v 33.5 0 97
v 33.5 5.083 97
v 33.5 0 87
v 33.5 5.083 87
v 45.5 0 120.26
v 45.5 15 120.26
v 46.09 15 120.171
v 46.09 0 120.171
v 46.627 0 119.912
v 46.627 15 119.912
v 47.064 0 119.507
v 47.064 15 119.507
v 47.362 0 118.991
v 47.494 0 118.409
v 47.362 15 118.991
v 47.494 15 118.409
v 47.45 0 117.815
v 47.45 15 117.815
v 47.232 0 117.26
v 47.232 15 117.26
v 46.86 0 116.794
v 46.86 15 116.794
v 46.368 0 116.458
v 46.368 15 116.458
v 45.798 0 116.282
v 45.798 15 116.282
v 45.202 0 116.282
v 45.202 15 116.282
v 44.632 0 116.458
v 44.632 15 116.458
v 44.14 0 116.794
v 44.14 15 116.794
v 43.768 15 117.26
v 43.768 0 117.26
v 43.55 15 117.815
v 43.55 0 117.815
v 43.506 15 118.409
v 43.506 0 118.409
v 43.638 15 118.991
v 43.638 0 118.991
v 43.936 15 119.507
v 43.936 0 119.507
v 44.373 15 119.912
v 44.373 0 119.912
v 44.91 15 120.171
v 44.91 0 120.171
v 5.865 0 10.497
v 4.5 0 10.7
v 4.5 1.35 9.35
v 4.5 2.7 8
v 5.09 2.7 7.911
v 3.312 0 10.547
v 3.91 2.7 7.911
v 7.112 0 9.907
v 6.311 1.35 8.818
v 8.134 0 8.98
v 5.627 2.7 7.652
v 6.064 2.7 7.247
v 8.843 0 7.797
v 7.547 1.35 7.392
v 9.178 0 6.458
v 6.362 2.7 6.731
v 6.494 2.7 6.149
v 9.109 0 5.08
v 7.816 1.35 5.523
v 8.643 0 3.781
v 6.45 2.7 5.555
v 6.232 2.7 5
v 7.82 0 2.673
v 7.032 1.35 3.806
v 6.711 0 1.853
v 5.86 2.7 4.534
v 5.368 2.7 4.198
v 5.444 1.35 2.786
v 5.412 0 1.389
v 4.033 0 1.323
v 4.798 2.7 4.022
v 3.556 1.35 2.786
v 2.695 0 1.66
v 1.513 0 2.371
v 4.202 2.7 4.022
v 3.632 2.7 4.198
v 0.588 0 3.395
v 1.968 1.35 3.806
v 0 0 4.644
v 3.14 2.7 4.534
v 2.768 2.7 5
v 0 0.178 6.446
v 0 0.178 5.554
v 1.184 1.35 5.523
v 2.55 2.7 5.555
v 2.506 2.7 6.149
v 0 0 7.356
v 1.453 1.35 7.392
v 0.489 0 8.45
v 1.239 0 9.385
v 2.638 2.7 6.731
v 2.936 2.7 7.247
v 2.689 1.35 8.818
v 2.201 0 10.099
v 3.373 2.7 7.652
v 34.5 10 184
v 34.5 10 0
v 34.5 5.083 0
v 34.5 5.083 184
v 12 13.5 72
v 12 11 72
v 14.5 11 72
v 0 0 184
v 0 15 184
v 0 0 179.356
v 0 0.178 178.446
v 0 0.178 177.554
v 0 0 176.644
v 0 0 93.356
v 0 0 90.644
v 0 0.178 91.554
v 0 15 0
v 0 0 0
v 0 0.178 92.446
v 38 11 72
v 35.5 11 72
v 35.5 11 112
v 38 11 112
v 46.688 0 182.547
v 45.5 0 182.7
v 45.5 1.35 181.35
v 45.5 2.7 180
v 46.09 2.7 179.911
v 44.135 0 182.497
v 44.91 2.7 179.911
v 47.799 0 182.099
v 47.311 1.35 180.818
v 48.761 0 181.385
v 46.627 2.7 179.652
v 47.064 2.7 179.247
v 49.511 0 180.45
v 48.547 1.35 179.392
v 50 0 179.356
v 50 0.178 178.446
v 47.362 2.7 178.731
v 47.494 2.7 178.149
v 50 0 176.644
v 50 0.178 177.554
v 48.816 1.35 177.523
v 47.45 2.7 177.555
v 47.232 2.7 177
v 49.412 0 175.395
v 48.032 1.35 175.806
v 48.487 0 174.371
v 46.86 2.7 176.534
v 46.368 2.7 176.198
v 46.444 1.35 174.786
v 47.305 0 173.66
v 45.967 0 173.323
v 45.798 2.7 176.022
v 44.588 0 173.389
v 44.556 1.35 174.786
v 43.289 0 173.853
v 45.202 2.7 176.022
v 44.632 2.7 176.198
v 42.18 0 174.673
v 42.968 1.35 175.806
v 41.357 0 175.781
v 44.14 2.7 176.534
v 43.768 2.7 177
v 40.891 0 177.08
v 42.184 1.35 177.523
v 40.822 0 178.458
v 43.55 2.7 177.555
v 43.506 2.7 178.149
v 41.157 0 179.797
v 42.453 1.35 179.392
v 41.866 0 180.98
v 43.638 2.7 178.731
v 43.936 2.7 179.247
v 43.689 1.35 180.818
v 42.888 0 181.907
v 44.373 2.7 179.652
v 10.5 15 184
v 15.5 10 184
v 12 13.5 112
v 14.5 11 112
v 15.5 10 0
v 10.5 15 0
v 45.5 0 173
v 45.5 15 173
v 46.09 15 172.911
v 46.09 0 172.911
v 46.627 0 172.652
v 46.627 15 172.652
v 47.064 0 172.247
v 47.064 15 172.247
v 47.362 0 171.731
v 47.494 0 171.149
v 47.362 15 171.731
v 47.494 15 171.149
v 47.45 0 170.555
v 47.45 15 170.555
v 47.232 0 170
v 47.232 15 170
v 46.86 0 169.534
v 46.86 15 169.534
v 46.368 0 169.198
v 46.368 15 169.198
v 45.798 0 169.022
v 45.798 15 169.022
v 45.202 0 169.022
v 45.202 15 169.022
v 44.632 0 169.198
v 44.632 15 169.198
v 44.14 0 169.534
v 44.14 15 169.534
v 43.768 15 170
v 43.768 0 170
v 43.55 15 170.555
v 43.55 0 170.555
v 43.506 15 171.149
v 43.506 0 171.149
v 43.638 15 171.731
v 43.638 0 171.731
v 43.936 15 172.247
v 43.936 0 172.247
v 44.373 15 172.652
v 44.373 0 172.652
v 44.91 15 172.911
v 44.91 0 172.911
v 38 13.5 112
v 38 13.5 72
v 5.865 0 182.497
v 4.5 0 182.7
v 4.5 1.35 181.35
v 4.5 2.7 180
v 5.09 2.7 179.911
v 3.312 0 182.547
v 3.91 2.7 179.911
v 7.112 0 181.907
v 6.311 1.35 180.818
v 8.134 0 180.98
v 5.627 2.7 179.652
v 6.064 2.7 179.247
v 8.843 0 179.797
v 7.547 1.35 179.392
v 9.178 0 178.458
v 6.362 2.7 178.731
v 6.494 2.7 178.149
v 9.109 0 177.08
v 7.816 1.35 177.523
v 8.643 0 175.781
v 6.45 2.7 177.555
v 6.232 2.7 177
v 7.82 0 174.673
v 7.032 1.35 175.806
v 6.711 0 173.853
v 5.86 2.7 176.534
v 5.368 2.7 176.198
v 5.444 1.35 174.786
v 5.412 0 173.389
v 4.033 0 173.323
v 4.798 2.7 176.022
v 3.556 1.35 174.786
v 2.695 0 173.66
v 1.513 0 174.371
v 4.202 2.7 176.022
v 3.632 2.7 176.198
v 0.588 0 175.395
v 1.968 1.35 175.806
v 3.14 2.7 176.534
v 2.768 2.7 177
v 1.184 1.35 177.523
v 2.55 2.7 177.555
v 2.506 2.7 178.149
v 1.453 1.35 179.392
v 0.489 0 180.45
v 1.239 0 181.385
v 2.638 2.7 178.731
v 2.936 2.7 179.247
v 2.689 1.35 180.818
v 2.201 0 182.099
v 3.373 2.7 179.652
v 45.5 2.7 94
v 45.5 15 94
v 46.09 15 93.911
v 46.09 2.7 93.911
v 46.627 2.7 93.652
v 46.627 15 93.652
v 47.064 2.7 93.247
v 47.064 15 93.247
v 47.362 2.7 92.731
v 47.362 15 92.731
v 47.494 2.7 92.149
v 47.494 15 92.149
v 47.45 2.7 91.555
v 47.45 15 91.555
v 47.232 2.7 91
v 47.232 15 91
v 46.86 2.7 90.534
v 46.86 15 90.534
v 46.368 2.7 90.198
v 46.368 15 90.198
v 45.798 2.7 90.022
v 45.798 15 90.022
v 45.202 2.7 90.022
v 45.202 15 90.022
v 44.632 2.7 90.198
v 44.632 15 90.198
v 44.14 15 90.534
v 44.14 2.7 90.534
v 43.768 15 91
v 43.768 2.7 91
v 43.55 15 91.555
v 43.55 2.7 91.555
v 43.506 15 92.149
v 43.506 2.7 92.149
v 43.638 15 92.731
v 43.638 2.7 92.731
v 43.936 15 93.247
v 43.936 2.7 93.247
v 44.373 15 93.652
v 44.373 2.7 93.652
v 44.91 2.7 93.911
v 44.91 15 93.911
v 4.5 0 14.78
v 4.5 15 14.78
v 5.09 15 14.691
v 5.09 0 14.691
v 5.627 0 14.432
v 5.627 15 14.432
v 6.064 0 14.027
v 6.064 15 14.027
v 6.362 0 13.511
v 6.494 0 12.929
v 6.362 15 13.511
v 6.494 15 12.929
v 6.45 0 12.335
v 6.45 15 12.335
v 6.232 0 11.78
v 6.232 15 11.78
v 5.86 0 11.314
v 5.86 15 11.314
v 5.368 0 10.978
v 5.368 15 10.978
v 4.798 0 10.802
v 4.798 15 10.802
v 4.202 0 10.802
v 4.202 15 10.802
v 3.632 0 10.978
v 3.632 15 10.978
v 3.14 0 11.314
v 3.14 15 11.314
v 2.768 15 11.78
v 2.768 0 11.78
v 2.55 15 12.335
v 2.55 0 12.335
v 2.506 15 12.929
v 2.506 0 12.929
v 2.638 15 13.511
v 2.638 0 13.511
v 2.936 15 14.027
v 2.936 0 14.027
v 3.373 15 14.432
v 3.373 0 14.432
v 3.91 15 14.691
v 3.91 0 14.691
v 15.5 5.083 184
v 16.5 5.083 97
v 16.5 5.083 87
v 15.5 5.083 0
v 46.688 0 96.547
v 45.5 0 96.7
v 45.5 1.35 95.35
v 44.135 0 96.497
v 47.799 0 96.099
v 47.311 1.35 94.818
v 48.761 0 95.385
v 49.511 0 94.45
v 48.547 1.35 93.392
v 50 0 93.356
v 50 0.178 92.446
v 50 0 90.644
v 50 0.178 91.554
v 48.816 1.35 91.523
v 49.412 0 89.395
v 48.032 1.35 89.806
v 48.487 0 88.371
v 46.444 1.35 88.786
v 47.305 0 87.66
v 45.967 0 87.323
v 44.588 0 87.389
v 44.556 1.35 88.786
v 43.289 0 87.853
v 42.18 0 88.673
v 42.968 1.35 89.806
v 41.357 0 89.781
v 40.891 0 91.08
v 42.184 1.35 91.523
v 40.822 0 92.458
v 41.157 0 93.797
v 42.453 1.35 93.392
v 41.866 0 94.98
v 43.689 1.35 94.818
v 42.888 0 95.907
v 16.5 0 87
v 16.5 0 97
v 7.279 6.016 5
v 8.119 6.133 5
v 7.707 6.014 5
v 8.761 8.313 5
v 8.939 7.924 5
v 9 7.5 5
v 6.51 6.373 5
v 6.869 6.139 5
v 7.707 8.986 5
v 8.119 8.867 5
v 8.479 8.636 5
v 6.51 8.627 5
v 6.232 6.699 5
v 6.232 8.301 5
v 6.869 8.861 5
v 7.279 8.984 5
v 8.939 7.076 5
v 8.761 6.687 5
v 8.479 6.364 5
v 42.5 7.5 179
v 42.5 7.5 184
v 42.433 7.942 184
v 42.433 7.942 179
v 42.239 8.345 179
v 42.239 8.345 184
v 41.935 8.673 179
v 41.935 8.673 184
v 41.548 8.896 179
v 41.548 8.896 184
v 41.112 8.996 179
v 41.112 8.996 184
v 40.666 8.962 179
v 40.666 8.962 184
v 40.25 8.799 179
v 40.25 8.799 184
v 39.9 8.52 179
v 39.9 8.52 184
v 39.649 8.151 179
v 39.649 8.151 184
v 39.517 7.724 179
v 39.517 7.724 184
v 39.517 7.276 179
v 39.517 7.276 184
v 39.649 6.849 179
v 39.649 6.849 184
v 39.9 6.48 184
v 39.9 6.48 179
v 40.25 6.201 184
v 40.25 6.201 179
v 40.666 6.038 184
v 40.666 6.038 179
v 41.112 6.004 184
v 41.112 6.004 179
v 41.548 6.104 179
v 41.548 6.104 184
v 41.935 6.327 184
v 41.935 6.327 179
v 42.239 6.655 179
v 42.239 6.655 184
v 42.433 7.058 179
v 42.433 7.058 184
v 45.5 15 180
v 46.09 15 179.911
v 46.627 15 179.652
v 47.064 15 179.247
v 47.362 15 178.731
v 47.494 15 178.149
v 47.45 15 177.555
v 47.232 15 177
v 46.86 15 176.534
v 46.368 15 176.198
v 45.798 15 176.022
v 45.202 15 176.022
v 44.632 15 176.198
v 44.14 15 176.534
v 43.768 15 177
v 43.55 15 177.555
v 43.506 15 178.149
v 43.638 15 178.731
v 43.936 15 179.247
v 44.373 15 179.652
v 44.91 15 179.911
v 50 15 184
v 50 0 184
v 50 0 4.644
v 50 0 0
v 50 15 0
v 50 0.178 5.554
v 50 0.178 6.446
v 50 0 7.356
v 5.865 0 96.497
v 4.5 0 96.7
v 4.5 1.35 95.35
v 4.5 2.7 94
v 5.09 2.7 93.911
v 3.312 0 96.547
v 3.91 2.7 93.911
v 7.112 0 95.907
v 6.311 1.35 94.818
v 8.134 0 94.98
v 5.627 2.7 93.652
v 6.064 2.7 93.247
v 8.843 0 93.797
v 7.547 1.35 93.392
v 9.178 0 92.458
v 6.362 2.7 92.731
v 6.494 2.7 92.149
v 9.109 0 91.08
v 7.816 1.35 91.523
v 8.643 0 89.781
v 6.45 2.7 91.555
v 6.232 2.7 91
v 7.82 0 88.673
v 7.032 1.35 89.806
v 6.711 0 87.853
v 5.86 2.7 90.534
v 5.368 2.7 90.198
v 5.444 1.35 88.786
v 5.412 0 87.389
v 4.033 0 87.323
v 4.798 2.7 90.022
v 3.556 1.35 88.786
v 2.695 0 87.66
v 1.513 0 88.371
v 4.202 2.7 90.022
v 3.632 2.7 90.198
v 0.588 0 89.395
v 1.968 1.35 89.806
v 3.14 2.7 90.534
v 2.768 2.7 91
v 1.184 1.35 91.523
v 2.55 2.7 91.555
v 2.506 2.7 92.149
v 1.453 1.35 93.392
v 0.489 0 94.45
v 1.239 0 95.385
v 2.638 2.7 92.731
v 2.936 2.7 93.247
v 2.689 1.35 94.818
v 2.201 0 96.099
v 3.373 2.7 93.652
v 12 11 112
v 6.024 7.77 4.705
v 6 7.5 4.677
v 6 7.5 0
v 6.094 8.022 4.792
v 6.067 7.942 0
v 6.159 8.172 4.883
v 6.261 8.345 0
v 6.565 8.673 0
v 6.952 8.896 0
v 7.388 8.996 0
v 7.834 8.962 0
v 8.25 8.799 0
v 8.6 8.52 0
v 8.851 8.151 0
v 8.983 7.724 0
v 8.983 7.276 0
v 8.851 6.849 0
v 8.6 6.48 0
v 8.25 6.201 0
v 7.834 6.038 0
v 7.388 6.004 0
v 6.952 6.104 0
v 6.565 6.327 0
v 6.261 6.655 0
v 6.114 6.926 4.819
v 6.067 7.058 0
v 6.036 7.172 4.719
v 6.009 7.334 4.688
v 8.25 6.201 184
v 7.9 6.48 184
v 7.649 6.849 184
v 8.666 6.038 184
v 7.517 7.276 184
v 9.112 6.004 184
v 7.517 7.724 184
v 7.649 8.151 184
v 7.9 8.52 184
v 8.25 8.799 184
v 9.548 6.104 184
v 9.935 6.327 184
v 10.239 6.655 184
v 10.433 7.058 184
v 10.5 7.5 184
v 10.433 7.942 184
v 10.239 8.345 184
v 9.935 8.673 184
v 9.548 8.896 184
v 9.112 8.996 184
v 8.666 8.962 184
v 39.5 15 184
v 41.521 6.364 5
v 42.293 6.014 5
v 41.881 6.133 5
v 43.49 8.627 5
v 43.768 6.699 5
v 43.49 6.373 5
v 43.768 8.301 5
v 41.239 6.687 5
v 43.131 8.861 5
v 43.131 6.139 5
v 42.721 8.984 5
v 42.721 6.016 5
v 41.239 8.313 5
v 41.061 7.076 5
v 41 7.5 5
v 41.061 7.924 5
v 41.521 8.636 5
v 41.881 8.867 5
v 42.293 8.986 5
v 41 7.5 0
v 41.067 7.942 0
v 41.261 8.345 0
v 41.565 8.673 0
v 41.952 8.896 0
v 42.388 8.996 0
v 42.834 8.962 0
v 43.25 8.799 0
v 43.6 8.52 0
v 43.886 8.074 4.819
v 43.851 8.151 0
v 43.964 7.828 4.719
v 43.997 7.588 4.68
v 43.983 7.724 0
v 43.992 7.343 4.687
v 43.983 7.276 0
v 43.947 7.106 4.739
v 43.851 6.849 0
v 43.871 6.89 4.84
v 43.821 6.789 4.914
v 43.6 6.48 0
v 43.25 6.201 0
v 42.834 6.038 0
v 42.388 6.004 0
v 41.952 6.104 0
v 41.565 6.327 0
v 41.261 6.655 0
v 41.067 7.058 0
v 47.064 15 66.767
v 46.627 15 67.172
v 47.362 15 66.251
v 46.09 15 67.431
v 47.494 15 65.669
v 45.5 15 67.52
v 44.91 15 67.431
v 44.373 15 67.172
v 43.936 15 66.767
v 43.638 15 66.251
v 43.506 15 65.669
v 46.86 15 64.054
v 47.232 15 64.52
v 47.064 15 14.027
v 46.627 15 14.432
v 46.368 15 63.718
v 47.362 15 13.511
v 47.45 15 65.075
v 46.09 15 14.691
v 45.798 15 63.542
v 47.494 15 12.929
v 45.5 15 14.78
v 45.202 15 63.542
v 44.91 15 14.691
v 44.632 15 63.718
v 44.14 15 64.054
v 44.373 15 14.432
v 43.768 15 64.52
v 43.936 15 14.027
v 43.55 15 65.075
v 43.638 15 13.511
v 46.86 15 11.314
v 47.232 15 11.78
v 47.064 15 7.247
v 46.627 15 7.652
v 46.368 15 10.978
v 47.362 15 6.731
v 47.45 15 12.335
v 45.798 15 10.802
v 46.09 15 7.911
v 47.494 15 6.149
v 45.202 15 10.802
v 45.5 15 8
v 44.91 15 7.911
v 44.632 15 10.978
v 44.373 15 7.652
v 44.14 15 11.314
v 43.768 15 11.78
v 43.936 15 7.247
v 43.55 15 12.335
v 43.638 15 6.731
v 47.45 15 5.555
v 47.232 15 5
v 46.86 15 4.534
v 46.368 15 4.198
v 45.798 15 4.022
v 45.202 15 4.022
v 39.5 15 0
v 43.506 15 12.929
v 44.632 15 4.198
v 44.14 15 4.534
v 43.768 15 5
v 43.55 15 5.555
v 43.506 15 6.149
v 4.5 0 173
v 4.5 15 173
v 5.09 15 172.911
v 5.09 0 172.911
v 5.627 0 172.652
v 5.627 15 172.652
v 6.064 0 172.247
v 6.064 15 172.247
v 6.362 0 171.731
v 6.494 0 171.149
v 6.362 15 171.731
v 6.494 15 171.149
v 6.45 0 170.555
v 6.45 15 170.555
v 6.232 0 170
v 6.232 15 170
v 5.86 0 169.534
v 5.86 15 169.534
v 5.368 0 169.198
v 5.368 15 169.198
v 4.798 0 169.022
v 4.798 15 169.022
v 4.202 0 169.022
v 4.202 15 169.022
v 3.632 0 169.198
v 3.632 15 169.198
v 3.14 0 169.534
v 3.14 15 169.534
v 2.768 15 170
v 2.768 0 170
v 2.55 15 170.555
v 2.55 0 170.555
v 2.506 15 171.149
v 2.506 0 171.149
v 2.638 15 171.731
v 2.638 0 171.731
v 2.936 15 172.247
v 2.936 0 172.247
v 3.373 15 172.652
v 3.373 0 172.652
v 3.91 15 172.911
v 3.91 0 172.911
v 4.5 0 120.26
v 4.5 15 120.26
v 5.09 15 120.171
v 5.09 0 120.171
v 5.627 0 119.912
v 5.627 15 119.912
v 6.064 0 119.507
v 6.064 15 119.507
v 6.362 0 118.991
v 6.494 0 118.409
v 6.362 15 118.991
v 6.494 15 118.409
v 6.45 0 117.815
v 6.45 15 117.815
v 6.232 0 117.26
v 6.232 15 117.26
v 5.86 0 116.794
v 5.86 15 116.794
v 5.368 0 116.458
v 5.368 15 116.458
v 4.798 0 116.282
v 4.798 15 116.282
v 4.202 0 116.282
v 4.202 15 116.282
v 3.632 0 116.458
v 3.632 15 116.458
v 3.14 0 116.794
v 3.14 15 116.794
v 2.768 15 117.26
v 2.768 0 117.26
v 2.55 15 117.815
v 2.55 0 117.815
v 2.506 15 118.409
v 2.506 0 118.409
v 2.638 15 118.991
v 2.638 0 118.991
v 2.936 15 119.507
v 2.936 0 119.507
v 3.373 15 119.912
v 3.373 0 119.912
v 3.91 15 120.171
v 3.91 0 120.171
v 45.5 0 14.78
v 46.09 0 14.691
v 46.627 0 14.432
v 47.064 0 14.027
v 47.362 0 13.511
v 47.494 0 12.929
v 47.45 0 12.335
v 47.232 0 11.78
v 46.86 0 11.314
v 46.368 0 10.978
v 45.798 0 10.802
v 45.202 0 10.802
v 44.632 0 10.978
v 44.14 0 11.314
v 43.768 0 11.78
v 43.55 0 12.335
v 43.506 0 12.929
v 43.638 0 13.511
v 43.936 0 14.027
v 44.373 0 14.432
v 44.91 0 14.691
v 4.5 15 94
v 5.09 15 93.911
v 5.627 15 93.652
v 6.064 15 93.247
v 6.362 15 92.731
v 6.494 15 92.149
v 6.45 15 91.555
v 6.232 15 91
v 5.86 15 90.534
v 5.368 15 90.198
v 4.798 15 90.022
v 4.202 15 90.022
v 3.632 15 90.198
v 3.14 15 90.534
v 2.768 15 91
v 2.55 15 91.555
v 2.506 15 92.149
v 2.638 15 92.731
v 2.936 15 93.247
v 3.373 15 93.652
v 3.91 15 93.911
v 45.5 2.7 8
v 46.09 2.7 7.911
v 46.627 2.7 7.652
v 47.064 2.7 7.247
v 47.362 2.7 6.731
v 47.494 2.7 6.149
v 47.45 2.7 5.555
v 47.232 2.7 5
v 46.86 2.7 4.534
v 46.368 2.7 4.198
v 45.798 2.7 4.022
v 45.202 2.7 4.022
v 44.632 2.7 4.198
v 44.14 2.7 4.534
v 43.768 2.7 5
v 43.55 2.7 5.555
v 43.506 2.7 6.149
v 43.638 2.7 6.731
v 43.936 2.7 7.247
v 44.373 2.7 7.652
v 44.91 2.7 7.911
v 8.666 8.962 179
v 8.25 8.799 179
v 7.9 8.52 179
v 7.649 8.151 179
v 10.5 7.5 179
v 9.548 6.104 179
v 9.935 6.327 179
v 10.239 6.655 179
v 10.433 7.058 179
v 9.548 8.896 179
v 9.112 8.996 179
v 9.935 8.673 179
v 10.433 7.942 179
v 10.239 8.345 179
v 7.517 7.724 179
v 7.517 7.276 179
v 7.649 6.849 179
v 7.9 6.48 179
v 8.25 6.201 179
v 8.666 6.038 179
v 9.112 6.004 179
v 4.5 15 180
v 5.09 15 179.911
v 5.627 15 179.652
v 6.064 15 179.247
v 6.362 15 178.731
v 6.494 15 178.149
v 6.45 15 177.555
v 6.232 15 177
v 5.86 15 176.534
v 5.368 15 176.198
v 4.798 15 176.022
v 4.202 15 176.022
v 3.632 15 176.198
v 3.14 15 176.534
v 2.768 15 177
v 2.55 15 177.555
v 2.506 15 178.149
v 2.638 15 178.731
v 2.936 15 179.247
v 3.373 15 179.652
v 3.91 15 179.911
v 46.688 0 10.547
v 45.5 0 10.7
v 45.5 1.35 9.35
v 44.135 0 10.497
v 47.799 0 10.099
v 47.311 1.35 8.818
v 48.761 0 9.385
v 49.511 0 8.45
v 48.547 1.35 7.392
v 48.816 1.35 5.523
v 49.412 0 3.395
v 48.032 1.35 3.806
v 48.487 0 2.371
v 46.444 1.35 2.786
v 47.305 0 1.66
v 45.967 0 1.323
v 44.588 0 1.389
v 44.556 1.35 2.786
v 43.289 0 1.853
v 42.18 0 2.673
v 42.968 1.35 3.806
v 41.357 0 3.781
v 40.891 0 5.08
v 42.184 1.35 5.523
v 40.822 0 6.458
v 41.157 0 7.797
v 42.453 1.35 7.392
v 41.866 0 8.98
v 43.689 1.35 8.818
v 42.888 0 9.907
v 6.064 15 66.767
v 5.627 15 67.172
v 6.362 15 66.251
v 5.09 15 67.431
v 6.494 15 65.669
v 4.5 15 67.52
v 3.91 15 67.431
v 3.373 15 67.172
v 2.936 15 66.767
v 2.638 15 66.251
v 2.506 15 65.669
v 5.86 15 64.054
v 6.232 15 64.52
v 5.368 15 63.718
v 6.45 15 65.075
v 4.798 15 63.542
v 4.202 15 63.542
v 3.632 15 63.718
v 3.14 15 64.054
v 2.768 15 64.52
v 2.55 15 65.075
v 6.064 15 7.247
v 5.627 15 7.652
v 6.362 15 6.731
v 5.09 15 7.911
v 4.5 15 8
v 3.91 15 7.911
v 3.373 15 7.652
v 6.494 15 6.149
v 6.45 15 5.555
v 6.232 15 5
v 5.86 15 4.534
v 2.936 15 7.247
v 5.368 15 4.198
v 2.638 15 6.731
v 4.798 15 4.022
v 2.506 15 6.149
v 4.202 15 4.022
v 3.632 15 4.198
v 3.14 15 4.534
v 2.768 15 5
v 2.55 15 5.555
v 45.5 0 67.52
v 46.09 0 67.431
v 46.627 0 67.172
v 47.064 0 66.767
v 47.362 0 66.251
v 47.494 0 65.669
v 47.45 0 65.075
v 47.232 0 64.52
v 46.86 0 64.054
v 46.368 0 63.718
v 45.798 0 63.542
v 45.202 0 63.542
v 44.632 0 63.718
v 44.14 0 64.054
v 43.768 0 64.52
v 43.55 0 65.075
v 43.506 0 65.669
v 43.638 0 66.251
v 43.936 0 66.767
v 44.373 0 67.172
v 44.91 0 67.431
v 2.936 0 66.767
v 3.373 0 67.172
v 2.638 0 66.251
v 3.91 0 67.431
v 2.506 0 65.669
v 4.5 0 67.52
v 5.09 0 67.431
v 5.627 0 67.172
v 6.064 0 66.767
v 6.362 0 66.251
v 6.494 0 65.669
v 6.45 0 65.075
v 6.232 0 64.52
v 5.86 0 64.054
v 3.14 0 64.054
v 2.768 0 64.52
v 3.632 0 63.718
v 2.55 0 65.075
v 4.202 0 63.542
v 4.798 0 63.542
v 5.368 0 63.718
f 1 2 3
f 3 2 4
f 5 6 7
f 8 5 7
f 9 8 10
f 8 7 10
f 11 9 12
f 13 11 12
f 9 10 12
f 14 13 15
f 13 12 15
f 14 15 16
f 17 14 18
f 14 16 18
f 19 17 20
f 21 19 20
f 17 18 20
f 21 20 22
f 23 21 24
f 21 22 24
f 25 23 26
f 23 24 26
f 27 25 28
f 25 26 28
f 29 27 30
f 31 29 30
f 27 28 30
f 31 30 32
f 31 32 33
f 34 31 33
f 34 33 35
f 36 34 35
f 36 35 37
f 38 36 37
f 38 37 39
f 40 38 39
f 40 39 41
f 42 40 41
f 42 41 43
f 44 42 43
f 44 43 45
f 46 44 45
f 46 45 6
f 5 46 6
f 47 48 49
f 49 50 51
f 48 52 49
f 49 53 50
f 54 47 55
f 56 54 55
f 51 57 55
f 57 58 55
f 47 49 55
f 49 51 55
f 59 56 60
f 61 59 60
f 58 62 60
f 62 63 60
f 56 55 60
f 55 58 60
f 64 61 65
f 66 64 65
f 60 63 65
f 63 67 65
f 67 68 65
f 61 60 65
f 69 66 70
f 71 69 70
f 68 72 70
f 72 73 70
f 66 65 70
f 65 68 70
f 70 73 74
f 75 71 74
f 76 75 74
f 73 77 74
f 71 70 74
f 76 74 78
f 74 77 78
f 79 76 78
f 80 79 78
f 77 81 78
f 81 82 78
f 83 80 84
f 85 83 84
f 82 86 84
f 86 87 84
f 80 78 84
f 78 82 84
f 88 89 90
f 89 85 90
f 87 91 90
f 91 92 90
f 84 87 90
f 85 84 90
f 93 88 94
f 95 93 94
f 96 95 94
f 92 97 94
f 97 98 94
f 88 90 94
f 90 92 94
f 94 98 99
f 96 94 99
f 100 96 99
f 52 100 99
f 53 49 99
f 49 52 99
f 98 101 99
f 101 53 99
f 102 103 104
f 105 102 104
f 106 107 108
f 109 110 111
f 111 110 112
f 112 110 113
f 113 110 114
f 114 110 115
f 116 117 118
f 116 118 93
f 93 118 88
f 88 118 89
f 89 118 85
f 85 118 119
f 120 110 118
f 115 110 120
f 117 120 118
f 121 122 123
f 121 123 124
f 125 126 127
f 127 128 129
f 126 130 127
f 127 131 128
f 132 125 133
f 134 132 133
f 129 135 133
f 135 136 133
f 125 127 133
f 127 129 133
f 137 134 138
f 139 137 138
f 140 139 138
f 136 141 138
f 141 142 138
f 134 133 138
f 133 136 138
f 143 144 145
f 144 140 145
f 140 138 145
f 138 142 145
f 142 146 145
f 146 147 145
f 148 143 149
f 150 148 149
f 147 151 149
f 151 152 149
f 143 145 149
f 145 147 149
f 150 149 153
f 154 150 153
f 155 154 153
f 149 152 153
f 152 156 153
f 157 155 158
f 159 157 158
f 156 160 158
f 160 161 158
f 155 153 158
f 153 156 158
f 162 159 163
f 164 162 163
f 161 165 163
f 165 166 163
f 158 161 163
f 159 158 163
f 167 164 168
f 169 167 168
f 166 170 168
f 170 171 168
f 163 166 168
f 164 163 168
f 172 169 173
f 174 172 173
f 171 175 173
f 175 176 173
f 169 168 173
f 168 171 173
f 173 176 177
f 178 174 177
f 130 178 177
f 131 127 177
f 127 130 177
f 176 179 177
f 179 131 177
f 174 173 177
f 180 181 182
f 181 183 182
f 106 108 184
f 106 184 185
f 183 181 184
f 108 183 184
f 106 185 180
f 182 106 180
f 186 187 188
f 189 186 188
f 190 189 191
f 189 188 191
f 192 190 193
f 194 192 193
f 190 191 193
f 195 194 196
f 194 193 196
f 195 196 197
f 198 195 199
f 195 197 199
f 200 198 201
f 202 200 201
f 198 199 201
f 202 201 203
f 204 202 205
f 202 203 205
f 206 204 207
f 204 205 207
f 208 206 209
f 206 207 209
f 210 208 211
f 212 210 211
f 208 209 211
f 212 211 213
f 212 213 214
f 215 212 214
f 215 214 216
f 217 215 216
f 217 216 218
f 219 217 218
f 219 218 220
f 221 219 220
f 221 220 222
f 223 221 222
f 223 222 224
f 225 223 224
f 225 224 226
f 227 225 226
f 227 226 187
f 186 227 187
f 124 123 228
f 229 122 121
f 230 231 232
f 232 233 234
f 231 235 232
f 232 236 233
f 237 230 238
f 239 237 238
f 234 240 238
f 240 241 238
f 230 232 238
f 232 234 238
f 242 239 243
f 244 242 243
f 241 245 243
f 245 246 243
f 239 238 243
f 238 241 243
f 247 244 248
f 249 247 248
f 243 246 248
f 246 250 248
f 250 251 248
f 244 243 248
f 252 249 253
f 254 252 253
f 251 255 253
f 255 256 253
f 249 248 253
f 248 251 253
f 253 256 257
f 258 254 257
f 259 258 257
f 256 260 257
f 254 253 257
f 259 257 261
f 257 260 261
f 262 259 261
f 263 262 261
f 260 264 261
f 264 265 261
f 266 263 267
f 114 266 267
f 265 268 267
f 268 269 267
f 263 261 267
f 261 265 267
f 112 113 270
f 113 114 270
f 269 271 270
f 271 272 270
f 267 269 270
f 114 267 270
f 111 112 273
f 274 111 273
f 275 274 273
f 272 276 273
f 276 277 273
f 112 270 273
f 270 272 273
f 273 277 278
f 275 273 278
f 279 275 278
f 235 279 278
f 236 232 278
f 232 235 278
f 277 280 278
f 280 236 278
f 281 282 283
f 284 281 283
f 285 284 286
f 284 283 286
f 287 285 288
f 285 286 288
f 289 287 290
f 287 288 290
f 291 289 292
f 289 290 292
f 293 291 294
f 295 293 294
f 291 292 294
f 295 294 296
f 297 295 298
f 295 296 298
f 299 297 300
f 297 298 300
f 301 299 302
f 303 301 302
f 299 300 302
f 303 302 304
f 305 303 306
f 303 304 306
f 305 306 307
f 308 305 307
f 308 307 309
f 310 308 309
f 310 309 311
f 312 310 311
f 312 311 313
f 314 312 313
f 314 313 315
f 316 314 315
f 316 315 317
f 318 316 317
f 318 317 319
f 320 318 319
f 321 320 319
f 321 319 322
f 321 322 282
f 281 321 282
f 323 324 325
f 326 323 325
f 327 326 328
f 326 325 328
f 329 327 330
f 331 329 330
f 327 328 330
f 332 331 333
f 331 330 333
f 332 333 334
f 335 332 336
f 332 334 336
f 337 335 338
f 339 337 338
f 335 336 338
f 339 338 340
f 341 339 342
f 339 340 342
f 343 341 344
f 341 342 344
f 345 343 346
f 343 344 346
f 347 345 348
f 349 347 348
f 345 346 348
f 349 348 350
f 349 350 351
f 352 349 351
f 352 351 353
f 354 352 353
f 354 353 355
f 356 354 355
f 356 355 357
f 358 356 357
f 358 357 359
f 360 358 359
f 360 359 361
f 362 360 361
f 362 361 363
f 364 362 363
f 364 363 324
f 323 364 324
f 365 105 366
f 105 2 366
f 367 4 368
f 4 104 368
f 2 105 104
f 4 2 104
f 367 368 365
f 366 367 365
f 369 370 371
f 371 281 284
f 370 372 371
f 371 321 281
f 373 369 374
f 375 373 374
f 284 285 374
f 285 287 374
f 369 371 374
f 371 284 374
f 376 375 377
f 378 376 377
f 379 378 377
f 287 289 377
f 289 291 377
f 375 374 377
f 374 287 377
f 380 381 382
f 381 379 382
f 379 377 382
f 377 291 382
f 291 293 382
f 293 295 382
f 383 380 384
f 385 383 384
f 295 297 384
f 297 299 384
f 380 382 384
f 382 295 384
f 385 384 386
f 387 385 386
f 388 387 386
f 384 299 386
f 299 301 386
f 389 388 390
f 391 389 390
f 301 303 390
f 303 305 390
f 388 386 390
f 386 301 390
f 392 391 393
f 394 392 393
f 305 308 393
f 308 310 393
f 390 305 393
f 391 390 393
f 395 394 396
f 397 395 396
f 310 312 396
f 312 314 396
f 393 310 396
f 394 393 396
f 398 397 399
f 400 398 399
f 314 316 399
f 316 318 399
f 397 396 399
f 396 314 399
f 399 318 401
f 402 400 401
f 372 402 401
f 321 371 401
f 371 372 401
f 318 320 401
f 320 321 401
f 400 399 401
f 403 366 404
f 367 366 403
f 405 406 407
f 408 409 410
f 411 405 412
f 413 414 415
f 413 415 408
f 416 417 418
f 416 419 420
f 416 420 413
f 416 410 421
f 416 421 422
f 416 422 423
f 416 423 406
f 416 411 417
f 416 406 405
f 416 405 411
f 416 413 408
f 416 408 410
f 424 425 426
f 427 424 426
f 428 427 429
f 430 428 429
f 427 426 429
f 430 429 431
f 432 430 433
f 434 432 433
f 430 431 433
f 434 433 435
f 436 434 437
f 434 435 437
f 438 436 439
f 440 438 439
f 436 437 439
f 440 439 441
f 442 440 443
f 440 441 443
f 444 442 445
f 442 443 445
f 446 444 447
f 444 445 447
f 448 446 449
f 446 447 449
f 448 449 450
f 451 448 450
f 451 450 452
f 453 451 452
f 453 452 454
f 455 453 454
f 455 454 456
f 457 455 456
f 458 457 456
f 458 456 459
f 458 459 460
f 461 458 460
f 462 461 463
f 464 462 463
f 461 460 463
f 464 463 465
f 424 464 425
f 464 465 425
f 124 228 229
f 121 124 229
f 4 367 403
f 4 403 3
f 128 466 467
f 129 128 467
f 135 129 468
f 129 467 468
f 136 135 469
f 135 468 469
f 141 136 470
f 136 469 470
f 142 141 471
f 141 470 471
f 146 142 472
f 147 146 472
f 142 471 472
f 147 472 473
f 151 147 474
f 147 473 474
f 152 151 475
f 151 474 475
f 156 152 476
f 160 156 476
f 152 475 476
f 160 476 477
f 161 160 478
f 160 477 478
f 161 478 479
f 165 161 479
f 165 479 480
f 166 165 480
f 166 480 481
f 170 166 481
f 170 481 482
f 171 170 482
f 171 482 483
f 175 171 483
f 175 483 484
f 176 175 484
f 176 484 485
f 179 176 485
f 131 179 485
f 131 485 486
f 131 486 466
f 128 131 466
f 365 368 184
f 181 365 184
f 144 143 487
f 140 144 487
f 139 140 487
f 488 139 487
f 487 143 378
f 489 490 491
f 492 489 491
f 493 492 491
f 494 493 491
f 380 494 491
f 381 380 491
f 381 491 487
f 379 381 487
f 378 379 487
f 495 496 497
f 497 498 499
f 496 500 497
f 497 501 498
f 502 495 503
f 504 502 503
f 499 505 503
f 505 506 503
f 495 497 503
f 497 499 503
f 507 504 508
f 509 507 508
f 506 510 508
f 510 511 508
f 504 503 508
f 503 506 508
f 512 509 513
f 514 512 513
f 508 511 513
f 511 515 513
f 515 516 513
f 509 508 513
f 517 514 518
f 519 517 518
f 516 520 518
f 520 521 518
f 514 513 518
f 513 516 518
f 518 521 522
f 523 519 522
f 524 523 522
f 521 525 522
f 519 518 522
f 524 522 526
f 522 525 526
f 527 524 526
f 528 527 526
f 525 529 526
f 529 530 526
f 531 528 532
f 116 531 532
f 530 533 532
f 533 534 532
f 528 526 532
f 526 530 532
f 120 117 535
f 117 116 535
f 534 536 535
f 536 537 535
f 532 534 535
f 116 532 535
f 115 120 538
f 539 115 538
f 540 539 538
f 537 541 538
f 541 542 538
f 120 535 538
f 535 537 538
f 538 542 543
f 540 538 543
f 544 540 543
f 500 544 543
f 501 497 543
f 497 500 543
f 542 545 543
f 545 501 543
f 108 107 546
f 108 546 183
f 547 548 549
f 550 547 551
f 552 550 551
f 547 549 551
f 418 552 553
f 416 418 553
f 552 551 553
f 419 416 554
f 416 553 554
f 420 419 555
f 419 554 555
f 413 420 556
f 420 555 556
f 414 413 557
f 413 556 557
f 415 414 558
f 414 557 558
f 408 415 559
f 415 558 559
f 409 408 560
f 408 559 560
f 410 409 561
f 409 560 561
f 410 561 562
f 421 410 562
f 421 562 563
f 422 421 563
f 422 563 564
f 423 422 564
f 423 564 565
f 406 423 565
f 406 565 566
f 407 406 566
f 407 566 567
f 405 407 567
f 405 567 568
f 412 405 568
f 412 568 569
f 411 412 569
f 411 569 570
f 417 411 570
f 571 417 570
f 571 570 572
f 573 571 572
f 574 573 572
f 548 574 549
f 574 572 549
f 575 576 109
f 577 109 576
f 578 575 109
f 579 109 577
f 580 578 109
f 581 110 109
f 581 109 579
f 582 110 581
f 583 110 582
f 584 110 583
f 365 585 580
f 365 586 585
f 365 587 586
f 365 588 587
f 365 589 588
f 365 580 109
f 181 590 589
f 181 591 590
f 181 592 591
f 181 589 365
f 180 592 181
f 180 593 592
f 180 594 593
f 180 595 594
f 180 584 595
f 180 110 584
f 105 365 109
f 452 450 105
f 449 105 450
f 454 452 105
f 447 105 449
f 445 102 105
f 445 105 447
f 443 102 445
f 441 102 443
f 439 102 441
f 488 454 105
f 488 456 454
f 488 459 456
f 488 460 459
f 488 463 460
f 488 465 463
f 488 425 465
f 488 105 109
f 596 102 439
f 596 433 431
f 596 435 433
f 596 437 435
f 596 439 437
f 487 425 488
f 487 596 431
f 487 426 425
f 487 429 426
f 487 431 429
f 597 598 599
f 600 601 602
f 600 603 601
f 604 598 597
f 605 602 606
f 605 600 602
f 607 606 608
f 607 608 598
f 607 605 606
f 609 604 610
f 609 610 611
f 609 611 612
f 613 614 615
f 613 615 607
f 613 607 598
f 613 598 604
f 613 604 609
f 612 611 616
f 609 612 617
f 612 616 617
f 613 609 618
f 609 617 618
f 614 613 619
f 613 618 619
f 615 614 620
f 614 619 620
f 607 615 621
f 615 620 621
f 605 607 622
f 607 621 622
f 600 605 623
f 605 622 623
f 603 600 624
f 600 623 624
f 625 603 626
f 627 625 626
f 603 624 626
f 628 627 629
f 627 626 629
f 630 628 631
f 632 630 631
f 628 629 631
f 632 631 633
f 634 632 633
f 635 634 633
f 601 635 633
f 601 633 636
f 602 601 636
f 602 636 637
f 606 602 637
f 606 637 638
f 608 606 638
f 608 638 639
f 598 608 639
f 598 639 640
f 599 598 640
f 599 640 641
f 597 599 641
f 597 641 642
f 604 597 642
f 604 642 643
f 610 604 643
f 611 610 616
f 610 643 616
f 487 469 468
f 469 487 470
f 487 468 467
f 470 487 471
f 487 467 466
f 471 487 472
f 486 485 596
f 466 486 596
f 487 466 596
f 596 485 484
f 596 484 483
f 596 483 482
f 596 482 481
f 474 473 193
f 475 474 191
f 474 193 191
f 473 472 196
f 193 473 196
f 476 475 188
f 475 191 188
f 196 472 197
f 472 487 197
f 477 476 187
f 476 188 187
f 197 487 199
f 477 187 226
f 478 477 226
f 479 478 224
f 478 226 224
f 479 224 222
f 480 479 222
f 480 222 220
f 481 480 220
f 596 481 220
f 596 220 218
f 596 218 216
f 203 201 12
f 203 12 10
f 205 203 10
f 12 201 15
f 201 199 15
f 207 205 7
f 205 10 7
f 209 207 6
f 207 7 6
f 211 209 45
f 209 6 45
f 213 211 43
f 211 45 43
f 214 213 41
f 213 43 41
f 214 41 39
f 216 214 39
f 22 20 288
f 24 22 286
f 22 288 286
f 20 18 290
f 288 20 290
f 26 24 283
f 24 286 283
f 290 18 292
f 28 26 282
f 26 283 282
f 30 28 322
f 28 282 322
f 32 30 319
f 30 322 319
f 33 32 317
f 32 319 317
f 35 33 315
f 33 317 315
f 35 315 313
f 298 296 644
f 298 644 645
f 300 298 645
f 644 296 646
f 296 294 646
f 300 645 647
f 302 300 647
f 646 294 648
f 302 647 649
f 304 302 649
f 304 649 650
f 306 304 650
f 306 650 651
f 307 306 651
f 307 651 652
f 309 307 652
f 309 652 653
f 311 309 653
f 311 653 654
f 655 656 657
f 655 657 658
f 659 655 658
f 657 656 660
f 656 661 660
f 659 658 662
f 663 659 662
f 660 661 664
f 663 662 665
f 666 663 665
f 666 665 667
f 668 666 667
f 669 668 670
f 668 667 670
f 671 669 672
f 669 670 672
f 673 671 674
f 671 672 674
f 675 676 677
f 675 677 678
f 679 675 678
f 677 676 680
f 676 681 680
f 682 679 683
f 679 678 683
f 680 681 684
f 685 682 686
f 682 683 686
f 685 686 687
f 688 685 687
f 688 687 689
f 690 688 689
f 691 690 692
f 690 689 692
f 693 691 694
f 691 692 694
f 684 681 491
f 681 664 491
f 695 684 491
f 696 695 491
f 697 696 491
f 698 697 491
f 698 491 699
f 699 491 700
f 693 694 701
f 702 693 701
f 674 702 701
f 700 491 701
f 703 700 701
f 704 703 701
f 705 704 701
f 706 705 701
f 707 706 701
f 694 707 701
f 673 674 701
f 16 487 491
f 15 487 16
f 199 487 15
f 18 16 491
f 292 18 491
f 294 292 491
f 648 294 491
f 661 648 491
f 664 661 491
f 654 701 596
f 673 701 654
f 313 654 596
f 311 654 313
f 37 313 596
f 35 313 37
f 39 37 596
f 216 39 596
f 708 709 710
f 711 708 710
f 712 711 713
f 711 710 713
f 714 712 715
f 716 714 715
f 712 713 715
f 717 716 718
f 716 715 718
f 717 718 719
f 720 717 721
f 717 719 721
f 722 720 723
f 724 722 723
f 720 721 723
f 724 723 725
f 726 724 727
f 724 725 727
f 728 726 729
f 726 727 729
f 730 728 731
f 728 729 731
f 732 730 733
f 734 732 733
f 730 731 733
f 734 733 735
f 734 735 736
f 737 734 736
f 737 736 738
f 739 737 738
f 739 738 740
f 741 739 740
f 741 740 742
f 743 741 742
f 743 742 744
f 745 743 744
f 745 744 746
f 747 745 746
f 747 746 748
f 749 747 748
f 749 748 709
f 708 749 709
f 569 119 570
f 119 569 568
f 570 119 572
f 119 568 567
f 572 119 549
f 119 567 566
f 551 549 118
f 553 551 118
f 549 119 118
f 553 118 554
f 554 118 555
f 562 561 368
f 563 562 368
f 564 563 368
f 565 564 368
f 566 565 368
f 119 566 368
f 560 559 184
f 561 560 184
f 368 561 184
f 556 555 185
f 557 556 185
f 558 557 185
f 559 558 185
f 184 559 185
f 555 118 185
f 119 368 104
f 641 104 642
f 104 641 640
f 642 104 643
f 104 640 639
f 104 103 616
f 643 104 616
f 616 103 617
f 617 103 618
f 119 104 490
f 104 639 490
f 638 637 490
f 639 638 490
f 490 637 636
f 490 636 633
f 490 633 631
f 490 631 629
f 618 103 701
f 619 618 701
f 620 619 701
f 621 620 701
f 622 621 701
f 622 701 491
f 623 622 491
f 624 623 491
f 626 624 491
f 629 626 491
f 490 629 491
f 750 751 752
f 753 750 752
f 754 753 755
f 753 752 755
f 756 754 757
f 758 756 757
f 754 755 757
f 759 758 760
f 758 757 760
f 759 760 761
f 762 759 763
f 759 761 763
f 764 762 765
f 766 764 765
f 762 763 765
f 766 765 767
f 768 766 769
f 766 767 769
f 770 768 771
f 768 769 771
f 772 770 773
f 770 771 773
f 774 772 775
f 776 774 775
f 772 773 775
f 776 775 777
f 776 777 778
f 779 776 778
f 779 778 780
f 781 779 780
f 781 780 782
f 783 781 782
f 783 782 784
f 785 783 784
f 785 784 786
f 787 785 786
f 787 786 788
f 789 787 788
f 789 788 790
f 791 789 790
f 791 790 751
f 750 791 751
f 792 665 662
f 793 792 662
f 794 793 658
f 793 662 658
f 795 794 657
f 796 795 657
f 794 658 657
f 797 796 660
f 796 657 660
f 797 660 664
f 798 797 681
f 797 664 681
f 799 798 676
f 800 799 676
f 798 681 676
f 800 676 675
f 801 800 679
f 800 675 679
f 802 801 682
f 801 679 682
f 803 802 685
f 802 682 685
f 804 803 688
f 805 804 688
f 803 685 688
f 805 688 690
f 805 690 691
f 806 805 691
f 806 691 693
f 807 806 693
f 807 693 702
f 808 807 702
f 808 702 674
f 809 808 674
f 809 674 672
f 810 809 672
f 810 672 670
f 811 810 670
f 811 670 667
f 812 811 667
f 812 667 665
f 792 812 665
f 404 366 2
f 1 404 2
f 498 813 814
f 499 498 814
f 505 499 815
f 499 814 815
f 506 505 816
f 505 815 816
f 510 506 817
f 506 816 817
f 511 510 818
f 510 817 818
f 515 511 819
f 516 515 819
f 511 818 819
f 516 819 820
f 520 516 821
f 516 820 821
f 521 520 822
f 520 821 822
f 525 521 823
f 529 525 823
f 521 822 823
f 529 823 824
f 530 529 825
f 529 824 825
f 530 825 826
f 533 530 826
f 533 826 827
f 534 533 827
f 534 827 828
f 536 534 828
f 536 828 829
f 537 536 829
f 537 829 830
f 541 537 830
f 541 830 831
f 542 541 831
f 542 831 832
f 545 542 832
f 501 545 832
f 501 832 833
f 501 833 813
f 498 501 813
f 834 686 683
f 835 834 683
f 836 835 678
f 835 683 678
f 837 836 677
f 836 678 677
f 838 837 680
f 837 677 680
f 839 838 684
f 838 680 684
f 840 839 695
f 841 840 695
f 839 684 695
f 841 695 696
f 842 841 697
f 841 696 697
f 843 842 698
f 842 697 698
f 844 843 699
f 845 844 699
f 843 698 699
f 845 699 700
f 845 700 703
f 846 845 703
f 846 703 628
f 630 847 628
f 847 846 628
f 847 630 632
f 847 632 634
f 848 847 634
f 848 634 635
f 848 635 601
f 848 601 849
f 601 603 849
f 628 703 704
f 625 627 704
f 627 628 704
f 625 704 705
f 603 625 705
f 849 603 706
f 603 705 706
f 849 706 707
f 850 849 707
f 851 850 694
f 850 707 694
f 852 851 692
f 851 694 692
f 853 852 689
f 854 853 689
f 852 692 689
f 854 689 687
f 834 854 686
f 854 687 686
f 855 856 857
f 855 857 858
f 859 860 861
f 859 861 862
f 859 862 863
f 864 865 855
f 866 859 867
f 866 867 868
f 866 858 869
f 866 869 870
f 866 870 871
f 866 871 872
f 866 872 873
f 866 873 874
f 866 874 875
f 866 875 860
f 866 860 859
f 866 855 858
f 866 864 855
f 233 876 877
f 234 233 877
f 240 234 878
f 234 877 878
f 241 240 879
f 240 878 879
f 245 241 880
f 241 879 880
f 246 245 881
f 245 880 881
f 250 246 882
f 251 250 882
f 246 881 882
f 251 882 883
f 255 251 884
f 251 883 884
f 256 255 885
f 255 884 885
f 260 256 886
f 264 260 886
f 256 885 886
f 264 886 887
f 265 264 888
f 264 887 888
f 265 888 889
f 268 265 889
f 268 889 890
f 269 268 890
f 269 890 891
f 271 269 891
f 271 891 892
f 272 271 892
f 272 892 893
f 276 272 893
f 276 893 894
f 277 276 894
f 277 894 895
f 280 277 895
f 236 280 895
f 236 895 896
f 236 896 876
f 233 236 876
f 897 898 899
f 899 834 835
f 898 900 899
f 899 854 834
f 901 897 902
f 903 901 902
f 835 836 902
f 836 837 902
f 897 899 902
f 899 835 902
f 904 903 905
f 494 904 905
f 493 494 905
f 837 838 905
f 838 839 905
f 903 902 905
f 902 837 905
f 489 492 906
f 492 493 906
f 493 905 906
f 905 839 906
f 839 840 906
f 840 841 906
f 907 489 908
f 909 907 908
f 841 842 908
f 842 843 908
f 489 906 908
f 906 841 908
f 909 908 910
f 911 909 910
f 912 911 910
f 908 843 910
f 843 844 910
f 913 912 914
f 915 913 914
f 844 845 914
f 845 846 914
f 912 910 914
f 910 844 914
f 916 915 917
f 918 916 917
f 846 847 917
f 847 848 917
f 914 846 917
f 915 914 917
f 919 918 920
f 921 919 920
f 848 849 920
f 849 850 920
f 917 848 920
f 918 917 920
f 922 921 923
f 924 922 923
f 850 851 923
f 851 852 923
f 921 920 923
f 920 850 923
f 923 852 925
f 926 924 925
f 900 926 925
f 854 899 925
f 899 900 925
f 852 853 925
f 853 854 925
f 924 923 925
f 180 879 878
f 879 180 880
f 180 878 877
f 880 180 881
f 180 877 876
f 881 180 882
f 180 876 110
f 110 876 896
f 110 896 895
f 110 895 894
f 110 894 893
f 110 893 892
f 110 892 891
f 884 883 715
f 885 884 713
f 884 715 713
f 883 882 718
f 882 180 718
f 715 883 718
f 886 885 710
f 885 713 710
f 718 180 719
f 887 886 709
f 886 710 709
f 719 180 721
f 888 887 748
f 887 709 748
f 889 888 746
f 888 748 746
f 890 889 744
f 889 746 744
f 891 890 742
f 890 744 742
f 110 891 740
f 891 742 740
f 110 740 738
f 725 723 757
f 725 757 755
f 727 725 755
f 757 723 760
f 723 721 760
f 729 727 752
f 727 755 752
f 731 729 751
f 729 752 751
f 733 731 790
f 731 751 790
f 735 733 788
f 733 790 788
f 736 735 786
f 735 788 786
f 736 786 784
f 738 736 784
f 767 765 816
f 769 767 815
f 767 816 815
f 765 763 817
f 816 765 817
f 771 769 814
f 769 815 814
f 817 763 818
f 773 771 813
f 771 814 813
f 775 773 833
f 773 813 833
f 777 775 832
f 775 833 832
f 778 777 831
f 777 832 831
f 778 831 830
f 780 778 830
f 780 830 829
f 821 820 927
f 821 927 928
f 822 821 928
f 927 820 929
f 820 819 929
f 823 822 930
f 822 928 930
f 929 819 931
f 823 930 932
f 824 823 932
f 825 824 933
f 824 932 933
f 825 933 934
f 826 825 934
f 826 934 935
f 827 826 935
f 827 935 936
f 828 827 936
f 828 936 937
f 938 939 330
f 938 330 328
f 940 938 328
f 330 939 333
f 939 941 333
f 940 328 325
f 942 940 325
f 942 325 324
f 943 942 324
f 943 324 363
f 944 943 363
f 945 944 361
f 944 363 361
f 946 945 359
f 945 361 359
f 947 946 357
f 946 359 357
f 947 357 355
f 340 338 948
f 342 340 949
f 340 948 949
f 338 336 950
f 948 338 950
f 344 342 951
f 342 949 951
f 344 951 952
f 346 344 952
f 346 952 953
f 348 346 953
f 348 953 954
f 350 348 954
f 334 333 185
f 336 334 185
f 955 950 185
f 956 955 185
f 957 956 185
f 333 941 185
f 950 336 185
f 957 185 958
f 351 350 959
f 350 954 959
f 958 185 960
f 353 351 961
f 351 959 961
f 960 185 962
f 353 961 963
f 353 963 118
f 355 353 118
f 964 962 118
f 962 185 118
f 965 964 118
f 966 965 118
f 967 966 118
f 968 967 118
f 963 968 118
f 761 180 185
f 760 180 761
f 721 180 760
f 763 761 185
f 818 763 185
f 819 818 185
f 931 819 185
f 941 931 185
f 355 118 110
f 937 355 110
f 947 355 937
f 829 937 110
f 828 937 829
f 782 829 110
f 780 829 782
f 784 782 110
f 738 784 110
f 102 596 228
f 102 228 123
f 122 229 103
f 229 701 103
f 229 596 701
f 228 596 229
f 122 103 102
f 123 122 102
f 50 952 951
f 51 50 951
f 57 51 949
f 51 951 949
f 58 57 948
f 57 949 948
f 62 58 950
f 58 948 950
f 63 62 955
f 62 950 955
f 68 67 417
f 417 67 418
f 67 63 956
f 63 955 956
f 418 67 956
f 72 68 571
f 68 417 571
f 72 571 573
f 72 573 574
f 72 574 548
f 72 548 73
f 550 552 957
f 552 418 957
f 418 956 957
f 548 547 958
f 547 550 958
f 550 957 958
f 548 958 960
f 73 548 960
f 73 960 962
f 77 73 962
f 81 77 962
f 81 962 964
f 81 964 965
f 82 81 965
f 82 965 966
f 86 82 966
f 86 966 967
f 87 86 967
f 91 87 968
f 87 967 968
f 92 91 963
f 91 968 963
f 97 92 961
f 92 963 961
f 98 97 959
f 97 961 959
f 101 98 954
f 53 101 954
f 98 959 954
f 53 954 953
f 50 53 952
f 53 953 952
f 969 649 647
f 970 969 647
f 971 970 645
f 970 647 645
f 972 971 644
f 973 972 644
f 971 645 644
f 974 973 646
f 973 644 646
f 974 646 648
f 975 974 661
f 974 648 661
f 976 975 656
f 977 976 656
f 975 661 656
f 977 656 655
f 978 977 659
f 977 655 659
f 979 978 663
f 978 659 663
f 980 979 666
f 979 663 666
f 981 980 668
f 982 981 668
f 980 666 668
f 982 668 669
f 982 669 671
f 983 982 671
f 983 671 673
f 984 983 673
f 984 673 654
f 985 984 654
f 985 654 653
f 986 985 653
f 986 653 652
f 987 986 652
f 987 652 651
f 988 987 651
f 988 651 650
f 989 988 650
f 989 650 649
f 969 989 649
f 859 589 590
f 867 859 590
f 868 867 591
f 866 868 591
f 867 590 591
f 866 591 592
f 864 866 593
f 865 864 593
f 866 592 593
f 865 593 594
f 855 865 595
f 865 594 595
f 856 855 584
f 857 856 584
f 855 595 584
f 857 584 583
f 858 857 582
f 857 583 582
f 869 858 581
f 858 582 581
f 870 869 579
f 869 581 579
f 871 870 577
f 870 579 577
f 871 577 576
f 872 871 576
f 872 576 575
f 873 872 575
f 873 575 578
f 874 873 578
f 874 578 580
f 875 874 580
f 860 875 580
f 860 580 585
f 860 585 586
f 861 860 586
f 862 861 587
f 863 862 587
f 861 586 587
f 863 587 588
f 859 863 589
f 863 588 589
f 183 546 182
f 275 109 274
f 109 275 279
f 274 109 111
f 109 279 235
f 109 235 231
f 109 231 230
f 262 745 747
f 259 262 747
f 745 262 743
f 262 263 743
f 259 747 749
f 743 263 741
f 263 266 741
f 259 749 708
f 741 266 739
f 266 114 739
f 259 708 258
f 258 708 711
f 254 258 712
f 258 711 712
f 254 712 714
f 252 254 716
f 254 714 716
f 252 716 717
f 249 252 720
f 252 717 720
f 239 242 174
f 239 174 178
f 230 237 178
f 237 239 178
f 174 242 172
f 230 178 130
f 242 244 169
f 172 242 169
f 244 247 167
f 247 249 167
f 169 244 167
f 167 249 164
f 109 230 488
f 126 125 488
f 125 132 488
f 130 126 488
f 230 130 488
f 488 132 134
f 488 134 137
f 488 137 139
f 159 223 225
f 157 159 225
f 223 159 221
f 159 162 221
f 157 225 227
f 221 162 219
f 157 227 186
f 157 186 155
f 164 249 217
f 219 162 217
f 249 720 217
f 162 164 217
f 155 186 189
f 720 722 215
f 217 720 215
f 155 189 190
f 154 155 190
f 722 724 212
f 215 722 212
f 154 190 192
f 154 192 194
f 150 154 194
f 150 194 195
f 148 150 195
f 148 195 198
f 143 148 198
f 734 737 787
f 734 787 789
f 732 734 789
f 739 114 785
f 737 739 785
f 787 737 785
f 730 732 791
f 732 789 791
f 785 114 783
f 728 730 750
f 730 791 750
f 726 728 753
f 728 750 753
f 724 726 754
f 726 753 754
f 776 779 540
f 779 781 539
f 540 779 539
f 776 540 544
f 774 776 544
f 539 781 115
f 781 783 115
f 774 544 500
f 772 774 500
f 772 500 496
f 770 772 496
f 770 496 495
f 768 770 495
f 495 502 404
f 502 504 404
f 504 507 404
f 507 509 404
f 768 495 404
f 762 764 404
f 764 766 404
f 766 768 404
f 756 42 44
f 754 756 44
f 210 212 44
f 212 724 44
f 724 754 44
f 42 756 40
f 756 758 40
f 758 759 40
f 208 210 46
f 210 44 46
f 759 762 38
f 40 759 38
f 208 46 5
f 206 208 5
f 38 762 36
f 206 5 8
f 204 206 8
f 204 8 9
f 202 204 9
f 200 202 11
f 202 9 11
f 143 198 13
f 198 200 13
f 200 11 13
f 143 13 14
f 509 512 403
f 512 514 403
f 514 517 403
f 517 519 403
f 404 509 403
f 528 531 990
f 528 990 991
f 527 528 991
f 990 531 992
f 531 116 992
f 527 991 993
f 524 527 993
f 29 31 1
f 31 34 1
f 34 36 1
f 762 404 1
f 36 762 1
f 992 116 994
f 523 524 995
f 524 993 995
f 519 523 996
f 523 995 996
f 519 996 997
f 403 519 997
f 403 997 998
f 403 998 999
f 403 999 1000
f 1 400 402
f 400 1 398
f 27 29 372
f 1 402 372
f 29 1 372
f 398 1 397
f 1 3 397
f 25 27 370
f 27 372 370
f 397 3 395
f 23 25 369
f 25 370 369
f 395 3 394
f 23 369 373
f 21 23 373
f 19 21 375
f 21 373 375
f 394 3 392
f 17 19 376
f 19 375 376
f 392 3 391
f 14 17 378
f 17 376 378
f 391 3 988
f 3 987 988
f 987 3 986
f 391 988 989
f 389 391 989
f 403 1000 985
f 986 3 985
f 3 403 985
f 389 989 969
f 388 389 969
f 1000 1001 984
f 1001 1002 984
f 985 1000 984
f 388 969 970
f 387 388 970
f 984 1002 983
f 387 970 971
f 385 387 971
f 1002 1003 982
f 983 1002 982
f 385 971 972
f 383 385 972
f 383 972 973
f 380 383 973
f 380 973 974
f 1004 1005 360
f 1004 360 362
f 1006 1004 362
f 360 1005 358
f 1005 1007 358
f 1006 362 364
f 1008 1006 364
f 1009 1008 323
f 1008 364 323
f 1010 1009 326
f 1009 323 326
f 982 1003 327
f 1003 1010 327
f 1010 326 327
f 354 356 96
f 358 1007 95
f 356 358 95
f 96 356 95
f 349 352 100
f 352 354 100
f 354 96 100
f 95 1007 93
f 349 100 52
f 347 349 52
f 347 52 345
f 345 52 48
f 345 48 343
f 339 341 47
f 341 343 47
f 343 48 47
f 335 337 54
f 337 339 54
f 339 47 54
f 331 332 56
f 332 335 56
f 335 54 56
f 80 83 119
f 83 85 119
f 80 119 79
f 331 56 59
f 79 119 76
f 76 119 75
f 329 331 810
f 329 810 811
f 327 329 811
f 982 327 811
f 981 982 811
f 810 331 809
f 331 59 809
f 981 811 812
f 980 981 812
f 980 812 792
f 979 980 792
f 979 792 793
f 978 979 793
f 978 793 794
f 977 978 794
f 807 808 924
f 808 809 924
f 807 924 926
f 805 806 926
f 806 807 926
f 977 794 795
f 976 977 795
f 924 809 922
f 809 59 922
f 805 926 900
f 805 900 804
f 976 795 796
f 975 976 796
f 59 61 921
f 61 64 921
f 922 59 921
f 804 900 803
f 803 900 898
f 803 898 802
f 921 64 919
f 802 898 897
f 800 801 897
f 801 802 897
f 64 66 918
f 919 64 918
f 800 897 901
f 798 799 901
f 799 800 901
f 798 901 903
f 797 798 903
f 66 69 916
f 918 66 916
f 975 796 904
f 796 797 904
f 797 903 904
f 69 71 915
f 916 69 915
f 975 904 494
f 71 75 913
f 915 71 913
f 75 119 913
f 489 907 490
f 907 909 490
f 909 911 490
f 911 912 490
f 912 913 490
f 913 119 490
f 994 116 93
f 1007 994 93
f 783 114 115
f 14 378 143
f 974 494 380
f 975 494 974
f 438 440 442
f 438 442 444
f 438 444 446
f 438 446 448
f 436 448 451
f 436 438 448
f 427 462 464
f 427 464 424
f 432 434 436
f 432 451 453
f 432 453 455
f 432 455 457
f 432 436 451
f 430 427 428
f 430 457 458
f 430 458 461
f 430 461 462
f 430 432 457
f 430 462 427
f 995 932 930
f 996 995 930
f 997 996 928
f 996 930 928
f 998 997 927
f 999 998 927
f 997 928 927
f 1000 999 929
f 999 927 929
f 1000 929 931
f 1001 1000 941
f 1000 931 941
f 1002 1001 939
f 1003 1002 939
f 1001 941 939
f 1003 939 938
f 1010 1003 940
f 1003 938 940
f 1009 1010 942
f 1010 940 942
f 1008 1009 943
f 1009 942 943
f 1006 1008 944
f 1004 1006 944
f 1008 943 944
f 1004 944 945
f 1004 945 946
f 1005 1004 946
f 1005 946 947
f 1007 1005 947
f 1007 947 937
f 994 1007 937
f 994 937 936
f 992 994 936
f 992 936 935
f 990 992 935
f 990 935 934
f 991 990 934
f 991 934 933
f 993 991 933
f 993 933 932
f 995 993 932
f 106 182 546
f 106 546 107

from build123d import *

# Parameters (mm, degrees)
BOSS_EXTRU_1_DEPTH       = 184
ESQUISSE2_R              = 2
ENL_V_MAT_EXTRU_1_DEPTH  = 205.56
ESQUISSE4_R              = 2
ENL_V_MAT_EXTRU_2_DEPTH  = 205.56
CHANFREIN1_SIZE          = 2.7
ESQUISSE6_W              = 26
ESQUISSE6_H              = 40
ENL_V_MAT_EXTRU_3_DEPTH  = 4
ESQUISSE8_W              = 17
ESQUISSE8_H              = 10
ENL_V_MAT_EXTRU_6_DEPTH  = 10
ESQUISSE7_R              = 1.5
ENL_V_MAT_EXTRU_5_DEPTH  = 5
ESQUISSE9_R              = 1.5
ENL_V_MAT_EXTRU_10_DEPTH = 5


with BuildPart() as part:
    # Esquisse1 → Boss.-Extru.1 (new body)
    with BuildSketch(Plane.XY):
        Polygon((0, 0), (50, 0), (50, 15), (39.5, 15), (34.5, 10), (34.5, 5.083005244), (15.5, 5.083005244), (15.5, 10), (10.5, 15), (0, 15), align=None)
    extrude(amount=BOSS_EXTRU_1_DEPTH)

    # Esquisse2 → Enlèv. mat.-Extru.1 (cut)
    with BuildSketch(Plane(origin=(0, 15, 0), x_dir=(-1, 0, 0), z_dir=(0, 1, 0))):
        with Locations(Location((-4.5, 12.78, 0), (0, 0, 90))):
            Circle(ESQUISSE2_R)
        with Locations(Location((-45.5, 12.78, 0), (0, 0, 90))):
            Circle(ESQUISSE2_R)
        with Locations(Location((-4.5, 65.52, 0), (0, 0, 90))):
            Circle(ESQUISSE2_R)
        with Locations(Location((-45.5, 65.52, 0), (0, 0, 90))):
            Circle(ESQUISSE2_R)
        with Locations(Location((-4.5, 118.26, 0), (0, 0, 90))):
            Circle(ESQUISSE2_R)
        with Locations(Location((-45.5, 118.26, 0), (0, 0, 90))):
            Circle(ESQUISSE2_R)
        with Locations(Location((-4.5, 171, 0), (0, 0, 90))):
            Circle(ESQUISSE2_R)
        with Locations(Location((-45.5, 171, 0), (0, 0, 90))):
            Circle(ESQUISSE2_R)
    extrude(amount=-ENL_V_MAT_EXTRU_1_DEPTH, mode=Mode.SUBTRACT)

    # Esquisse4 → Enlèv. mat.-Extru.2 (cut)
    with BuildSketch(Plane(origin=(0, 15, 0), x_dir=(-1, 0, 0), z_dir=(0, 1, 0))):
        with Locations(Location((-4.5, 6, 0), (0, 0, 90))):
            Circle(ESQUISSE4_R)
        with Locations(Location((-45.5, 6, 0), (0, 0, 90))):
            Circle(ESQUISSE4_R)
        with Locations(Location((-45.5, 178, 0), (0, 0, 90))):
            Circle(ESQUISSE4_R)
        with Locations(Location((-4.5, 178, 0), (0, 0, 90))):
            Circle(ESQUISSE4_R)
        with Locations(Location((-4.5, 92, 0), (0, 0, 90))):
            Circle(ESQUISSE4_R)
        with Locations(Location((-45.5, 92, 0), (0, 0, 90))):
            Circle(ESQUISSE4_R)
    extrude(amount=-ENL_V_MAT_EXTRU_2_DEPTH, mode=Mode.SUBTRACT)

    # Chanfrein1
    # the kernel refuses this chamfer: 2.7 mm, written as the material it takes off along each edge
    with BuildSketch(Plane(origin=(4.5, 0, 6), x_dir=(0, 0, 1), z_dir=(-1, 0, 0))) as chanfrein1_piece_1:
        Polygon((2 + CHANFREIN1_SIZE, 0), (2, CHANFREIN1_SIZE), (2, 0), align=None)
    revolve(axis=Axis((4.5, 0, 6), (0, 1, 0)), mode=Mode.SUBTRACT)
    with BuildSketch(Plane(origin=(45.5, 0, 6), x_dir=(0, 0, 1), z_dir=(-1, 0, 0))) as chanfrein1_piece_2:
        Polygon((2 + CHANFREIN1_SIZE, 0), (2, CHANFREIN1_SIZE), (2, 0), align=None)
    revolve(axis=Axis((45.5, 0, 6), (0, 1, 0)), mode=Mode.SUBTRACT)
    with BuildSketch(Plane(origin=(45.5, 0, 178), x_dir=(0, 0, 1), z_dir=(-1, 0, 0))) as chanfrein1_piece_3:
        Polygon((2 + CHANFREIN1_SIZE, 0), (2, CHANFREIN1_SIZE), (2, 0), align=None)
    revolve(axis=Axis((45.5, 0, 178), (0, 1, 0)), mode=Mode.SUBTRACT)
    with BuildSketch(Plane(origin=(4.5, 0, 178), x_dir=(0, 0, 1), z_dir=(-1, 0, 0))) as chanfrein1_piece_4:
        Polygon((2 + CHANFREIN1_SIZE, 0), (2, CHANFREIN1_SIZE), (2, 0), align=None)
    revolve(axis=Axis((4.5, 0, 178), (0, 1, 0)), mode=Mode.SUBTRACT)
    with BuildSketch(Plane(origin=(4.5, 0, 92), x_dir=(0, 0, 1), z_dir=(-1, 0, 0))) as chanfrein1_piece_5:
        Polygon((2 + CHANFREIN1_SIZE, 0), (2, CHANFREIN1_SIZE), (2, 0), align=None)
    revolve(axis=Axis((4.5, 0, 92), (0, 1, 0)), mode=Mode.SUBTRACT)
    with BuildSketch(Plane(origin=(45.5, 0, 92), x_dir=(0, 0, 1), z_dir=(-1, 0, 0))) as chanfrein1_piece_6:
        Polygon((2 + CHANFREIN1_SIZE, 0), (2, CHANFREIN1_SIZE), (2, 0), align=None)
    revolve(axis=Axis((45.5, 0, 92), (0, 1, 0)), mode=Mode.SUBTRACT)

    # Esquisse6 → Enlèv. mat.-Extru.3 (cut)
    with BuildSketch(Plane(origin=(0, 15, 0), x_dir=(1, 0, 0), z_dir=(0, 1, 0))):
        with Locations((25, -92)):
            Rectangle(ESQUISSE6_W, ESQUISSE6_H)
    extrude(amount=-ENL_V_MAT_EXTRU_3_DEPTH, mode=Mode.SUBTRACT)

    # Esquisse8 → Enlèv. mat.-Extru.6 (cut)
    with BuildSketch(Plane(origin=(0, 5.083005244, 0), x_dir=(1, 0, 0), z_dir=(0, 1, 0))):
        with Locations((25, -92)):
            Rectangle(ESQUISSE8_W, ESQUISSE8_H)
    extrude(amount=-ENL_V_MAT_EXTRU_6_DEPTH, mode=Mode.SUBTRACT)

    # Esquisse7 → Enlèv. mat.-Extru.5 (cut)
    with BuildSketch(Plane.XY.offset(184)):
        with Locations((9, 7.5)):
            Circle(ESQUISSE7_R)
        with Locations((41, 7.5)):
            Circle(ESQUISSE7_R)
    extrude(amount=-ENL_V_MAT_EXTRU_5_DEPTH, mode=Mode.SUBTRACT)

    # Esquisse9 → Enlèv. mat.-Extru.10 (cut)
    with BuildSketch(Plane(origin=(0, 0, 0), x_dir=(-1, 0, 0), z_dir=(0, 0, -1))):
        with Locations((-42.5, 7.5)):
            Circle(ESQUISSE9_R)
        with Locations((-7.5, 7.5)):
            Circle(ESQUISSE9_R)
    extrude(amount=-ENL_V_MAT_EXTRU_10_DEPTH, mode=Mode.SUBTRACT)


solid = part.part
